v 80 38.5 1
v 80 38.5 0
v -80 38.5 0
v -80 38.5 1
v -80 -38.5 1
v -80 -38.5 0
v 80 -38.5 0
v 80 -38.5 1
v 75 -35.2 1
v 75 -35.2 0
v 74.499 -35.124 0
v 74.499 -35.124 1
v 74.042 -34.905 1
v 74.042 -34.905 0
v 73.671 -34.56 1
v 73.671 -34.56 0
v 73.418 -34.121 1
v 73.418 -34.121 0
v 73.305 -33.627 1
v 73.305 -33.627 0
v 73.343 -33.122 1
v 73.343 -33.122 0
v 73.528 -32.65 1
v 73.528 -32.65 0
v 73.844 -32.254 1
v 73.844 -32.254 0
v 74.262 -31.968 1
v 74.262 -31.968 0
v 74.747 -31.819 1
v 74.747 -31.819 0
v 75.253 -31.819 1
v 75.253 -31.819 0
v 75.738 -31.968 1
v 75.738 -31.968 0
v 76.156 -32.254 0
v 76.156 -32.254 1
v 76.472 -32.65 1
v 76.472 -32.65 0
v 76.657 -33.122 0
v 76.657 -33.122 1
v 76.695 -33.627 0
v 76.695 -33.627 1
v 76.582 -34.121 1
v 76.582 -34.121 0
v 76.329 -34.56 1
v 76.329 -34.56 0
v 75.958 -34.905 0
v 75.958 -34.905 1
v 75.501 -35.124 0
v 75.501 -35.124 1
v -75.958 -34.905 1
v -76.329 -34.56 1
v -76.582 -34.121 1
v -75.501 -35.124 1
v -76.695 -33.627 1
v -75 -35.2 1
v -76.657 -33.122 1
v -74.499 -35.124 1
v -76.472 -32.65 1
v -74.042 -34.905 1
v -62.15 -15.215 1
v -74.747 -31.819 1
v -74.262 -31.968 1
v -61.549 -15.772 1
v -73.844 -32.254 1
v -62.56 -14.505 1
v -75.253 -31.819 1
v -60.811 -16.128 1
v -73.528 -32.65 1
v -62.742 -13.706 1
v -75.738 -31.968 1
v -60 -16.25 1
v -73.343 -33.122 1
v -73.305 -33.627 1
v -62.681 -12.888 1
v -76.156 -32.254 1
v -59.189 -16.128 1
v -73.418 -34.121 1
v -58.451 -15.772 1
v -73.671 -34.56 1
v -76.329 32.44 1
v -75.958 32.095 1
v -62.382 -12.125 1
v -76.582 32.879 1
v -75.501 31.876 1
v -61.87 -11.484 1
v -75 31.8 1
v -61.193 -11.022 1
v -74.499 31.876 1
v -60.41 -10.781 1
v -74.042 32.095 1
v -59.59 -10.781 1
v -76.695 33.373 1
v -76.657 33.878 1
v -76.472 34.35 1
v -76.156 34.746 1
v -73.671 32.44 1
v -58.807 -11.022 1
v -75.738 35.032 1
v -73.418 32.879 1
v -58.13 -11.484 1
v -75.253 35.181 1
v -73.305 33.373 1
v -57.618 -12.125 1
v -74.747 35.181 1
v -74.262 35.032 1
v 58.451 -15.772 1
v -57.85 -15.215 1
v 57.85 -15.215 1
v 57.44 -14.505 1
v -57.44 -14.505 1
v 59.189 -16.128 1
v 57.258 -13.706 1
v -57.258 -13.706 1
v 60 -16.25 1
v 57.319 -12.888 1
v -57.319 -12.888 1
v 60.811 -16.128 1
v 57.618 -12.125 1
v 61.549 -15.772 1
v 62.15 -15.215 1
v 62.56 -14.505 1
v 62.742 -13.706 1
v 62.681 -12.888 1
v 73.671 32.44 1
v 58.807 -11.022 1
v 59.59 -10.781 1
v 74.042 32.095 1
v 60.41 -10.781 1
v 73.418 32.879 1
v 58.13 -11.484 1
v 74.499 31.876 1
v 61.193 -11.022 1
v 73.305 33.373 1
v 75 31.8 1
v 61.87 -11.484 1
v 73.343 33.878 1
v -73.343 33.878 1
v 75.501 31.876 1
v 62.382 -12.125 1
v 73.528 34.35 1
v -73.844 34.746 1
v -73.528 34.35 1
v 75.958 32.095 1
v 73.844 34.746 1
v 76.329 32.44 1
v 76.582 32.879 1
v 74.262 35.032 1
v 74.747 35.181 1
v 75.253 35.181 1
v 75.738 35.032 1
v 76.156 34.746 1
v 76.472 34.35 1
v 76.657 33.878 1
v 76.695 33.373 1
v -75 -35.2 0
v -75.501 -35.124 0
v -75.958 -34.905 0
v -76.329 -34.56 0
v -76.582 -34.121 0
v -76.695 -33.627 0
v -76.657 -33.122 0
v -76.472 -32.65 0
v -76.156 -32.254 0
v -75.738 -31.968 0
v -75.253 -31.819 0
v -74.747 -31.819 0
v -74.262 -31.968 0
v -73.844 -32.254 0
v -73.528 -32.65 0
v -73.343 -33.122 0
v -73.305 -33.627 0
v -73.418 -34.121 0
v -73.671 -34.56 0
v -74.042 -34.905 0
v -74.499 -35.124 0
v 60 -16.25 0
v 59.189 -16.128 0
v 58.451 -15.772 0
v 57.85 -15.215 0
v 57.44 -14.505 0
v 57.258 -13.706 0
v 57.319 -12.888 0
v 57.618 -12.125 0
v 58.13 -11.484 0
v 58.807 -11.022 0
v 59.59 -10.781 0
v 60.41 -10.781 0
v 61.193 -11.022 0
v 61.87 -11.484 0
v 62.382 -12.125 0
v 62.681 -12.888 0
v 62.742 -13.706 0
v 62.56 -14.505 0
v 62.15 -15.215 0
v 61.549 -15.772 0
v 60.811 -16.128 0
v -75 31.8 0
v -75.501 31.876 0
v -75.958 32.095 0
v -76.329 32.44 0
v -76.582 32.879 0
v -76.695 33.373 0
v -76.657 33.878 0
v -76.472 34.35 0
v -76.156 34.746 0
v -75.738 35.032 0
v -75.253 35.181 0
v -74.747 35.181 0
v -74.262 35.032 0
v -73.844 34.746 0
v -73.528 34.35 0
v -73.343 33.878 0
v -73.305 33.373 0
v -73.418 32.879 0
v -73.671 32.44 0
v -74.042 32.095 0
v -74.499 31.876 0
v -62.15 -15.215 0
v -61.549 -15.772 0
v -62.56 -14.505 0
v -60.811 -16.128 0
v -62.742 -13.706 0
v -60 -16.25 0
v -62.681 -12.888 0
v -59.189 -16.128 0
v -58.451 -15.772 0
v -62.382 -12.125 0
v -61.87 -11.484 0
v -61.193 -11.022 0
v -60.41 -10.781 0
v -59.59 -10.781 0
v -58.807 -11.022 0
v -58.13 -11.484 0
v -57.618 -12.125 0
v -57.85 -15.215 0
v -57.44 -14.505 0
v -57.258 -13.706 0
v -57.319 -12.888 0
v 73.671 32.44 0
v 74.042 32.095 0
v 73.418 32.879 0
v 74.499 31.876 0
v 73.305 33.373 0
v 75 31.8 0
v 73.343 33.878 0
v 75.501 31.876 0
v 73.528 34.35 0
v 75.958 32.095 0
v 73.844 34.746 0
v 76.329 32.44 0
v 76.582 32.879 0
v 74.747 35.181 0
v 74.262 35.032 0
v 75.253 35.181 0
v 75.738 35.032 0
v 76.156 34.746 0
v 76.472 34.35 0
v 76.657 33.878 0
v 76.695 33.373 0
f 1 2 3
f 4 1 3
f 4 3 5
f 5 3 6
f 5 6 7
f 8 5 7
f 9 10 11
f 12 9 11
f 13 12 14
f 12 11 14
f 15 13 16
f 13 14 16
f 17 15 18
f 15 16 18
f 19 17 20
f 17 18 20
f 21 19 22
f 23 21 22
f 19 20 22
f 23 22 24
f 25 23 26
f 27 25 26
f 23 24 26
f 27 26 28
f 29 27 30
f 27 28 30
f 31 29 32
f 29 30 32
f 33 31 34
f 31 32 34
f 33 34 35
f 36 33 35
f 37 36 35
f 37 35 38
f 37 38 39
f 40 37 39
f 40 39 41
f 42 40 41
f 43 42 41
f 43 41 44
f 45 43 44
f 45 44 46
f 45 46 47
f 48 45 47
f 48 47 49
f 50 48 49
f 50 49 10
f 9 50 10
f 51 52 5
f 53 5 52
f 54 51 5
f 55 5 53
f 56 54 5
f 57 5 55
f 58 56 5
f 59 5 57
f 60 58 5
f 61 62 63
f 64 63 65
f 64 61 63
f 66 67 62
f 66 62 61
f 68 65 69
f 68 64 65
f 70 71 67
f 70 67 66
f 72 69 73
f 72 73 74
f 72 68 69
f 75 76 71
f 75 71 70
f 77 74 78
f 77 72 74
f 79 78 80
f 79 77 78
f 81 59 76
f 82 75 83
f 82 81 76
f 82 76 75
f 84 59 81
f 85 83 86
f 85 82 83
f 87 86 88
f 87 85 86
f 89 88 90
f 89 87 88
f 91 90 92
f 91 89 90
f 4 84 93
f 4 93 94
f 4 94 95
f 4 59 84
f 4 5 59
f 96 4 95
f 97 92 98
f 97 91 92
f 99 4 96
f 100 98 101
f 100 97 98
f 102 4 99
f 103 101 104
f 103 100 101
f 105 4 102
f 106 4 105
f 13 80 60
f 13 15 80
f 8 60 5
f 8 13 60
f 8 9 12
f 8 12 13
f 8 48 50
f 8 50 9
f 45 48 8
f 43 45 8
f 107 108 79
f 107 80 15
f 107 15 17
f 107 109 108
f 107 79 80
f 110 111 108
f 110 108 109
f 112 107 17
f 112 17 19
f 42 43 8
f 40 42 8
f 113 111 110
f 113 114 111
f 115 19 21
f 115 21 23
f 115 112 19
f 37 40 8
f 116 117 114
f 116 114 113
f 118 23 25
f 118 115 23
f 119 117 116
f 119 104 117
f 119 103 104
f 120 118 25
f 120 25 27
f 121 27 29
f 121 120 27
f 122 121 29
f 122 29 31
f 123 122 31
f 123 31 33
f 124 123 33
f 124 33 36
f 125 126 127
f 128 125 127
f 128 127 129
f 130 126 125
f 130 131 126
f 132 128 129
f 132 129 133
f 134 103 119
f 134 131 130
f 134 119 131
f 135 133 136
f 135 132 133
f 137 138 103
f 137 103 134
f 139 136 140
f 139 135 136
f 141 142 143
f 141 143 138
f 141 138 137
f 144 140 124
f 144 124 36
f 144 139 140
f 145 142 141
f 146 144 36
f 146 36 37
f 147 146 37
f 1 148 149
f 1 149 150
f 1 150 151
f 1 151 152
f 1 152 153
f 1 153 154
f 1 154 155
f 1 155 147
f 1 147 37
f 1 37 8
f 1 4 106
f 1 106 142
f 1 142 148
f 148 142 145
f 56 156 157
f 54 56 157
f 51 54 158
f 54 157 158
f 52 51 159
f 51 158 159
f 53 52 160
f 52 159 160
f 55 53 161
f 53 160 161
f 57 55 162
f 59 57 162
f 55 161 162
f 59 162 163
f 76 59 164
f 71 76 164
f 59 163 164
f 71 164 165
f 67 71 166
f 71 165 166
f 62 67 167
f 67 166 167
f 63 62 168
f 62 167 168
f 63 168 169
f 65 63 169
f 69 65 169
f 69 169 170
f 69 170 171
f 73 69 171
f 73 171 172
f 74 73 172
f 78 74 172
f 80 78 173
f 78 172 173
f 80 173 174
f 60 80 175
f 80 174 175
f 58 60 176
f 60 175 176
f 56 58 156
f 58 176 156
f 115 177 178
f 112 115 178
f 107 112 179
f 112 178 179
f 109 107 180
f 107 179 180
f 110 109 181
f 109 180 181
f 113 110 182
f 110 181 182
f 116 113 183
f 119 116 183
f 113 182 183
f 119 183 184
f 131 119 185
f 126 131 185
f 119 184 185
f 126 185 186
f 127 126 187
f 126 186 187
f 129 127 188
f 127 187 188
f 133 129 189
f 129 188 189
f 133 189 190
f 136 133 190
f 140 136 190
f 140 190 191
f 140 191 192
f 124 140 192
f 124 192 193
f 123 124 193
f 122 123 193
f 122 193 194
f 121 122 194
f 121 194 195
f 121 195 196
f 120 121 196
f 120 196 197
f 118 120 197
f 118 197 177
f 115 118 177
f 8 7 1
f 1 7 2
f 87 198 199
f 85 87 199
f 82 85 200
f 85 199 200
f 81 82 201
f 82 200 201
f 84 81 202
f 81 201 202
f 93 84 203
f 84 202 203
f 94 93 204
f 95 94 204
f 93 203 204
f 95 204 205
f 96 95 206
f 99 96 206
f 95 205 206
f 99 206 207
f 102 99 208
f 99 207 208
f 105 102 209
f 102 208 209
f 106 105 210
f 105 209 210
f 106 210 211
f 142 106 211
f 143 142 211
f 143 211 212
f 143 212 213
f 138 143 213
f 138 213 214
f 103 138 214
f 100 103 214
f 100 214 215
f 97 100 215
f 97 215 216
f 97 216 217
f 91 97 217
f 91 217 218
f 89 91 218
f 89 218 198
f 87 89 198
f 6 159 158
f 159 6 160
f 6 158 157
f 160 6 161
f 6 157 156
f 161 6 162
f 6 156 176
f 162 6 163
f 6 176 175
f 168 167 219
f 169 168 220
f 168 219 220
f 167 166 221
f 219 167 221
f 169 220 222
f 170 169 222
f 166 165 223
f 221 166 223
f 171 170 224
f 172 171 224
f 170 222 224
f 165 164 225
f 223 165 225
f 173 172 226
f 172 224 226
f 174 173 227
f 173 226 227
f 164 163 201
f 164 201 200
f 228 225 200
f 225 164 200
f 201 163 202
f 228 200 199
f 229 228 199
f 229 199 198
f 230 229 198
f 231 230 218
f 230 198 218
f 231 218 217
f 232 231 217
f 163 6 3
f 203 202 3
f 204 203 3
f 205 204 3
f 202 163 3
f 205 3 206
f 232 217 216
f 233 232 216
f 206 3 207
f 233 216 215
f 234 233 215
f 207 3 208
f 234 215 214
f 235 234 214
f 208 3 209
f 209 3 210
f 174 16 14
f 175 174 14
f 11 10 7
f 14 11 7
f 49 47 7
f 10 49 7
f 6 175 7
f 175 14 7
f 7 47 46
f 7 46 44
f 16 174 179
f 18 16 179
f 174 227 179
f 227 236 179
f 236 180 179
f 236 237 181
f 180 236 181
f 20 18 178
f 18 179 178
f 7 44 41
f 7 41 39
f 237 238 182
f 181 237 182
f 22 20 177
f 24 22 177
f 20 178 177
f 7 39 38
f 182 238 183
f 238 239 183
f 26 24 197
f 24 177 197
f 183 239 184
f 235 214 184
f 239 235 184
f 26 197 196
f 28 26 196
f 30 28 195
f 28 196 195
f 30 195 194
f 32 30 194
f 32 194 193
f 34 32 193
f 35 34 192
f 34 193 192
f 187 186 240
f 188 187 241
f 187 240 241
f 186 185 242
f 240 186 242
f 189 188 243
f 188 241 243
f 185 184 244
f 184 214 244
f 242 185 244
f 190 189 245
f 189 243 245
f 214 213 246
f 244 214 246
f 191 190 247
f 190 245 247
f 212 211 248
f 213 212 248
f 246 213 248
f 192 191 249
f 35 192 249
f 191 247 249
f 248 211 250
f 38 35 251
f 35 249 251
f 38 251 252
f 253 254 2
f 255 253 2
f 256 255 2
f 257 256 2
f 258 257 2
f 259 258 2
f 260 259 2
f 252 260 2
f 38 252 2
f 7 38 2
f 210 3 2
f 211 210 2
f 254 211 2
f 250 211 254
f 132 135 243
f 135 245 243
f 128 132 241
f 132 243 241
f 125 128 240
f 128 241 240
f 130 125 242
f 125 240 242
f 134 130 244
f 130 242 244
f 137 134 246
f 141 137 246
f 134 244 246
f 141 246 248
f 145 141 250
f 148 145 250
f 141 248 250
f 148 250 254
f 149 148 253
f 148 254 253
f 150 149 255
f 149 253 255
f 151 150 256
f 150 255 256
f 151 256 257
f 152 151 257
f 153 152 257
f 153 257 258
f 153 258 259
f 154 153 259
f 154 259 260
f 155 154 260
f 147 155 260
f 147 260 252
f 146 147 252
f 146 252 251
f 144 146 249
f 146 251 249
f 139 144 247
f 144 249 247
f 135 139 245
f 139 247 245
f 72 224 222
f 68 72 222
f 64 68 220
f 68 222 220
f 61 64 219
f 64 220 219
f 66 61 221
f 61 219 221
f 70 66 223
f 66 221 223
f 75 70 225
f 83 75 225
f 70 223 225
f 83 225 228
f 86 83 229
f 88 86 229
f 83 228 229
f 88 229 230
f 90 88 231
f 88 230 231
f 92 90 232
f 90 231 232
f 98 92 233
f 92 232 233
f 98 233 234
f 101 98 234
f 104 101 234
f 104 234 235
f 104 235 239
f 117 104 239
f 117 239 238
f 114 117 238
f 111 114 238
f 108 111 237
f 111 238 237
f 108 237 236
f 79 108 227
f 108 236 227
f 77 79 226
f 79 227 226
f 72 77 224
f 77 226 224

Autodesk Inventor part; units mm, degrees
ref_plane "YZ Plane" through (0, 0, 0) normal (1, 0, 0) x (0, 1, 0)
ref_plane "XZ Plane" through (0, 0, 0) normal (0, 1, 0) x (-1, 0, 0)
ref_plane "XY Plane" through (0, 0, 0) normal (0, 0, 1) x (1, 0, 0)
sketch "スケッチ1" plane through (0, 0, 0) normal (0, 0, 1) x (1, 0, 0)
  line L0 (-80, -38.5) -> (80, -38.5)
  line L1 (80, -38.5) -> (80, 38.5)
  line L2 (80, 38.5) -> (-80, 38.5)
  line L3 (-80, 38.5) -> (-80, -38.5)
  line L4 (-80, -38.5) -> (80, 38.5) construction
  line L5 (80, -38.5) -> (-80, 38.5) construction
  point P0 (0, 0)
  dimension "d0" = 160
  dimension "d1" = 77
extrude "プレート1" add sketch "スケッチ1" along normal blind 1
sketch "スケッチ2" plane through (0, 0, 1) normal (0, 0, 1) x (1, 0, 0)
  line L0 (-80, -38.5) -> (-80, 38.5) projected
  line L1 (80, -38.5) -> (-80, -38.5) projected
  line L2 (80, 38.5) -> (80, -38.5) projected
  line L3 (-80, 38.5) -> (80, 38.5) projected
  line L4 (75, 33.5) -> (75, -33.5)
  line L5 (75, -33.5) -> (-75, -33.5)
  line L6 (-75, -33.5) -> (-75, 33.5)
  line L7 (-75, 33.5) -> (75, 33.5)
  point P0 (0, 0)
  dimension "d3" = 5
hole "穴1" at (-75, 33.5, 1) at (-75, -33.5, 1) at (75, -33.5, 1) at (75, 33.5, 1) direction (0, 0, -1) diameter 3.4 depth 1 clearance for "Flat Head Machine Screw" size "M3" standard "Ansi Metric M Profile"
sketch "スケッチ3" plane through (0, 0, 1) normal (0, 0, 1) x (1, 0, 0)
  line L0 (80, -38.5) -> (-80, -38.5) projected
  point P0 (0, 0)
  point P1 (-60, -13.5)
  point P2 (60, -13.5)
  dimension "d11" = 60
  dimension "d12" = 60
  dimension "d13" = 25
  dimension "d14" = 25
hole "穴2" at (-60, -13.5, 1) at (60, -13.5, 1) direction (0, 0, -1) diameter 5.5 end through all clearance for "Flat Head Machine Screw" size "M5" standard "Ansi Metric M Profile"
equation "\"d9\" = Thickness"
equation "\"d20\" = Thickness"
equation "\"d2\" = Thickness"
equation "\"BendRadius\" = Thickness"
equation "\"BendReliefWidth\" = Thickness"
equation "\"BendReliefDepth\" = 0.5 * Thickness"
equation "\"CornerReliefSize\" = 4 * Thickness"
equation "\"MinimumRemnant\" = 2 * Thickness"
equation "\"TransitionRadius\" = BendRadius"
equation "\"JacobiRadiusSize\" = Thickness"
equation "\"GapSize\" = Thickness"
equation "\"Thickness\" = 1"
properties part number "plate4" material "CFRP"
